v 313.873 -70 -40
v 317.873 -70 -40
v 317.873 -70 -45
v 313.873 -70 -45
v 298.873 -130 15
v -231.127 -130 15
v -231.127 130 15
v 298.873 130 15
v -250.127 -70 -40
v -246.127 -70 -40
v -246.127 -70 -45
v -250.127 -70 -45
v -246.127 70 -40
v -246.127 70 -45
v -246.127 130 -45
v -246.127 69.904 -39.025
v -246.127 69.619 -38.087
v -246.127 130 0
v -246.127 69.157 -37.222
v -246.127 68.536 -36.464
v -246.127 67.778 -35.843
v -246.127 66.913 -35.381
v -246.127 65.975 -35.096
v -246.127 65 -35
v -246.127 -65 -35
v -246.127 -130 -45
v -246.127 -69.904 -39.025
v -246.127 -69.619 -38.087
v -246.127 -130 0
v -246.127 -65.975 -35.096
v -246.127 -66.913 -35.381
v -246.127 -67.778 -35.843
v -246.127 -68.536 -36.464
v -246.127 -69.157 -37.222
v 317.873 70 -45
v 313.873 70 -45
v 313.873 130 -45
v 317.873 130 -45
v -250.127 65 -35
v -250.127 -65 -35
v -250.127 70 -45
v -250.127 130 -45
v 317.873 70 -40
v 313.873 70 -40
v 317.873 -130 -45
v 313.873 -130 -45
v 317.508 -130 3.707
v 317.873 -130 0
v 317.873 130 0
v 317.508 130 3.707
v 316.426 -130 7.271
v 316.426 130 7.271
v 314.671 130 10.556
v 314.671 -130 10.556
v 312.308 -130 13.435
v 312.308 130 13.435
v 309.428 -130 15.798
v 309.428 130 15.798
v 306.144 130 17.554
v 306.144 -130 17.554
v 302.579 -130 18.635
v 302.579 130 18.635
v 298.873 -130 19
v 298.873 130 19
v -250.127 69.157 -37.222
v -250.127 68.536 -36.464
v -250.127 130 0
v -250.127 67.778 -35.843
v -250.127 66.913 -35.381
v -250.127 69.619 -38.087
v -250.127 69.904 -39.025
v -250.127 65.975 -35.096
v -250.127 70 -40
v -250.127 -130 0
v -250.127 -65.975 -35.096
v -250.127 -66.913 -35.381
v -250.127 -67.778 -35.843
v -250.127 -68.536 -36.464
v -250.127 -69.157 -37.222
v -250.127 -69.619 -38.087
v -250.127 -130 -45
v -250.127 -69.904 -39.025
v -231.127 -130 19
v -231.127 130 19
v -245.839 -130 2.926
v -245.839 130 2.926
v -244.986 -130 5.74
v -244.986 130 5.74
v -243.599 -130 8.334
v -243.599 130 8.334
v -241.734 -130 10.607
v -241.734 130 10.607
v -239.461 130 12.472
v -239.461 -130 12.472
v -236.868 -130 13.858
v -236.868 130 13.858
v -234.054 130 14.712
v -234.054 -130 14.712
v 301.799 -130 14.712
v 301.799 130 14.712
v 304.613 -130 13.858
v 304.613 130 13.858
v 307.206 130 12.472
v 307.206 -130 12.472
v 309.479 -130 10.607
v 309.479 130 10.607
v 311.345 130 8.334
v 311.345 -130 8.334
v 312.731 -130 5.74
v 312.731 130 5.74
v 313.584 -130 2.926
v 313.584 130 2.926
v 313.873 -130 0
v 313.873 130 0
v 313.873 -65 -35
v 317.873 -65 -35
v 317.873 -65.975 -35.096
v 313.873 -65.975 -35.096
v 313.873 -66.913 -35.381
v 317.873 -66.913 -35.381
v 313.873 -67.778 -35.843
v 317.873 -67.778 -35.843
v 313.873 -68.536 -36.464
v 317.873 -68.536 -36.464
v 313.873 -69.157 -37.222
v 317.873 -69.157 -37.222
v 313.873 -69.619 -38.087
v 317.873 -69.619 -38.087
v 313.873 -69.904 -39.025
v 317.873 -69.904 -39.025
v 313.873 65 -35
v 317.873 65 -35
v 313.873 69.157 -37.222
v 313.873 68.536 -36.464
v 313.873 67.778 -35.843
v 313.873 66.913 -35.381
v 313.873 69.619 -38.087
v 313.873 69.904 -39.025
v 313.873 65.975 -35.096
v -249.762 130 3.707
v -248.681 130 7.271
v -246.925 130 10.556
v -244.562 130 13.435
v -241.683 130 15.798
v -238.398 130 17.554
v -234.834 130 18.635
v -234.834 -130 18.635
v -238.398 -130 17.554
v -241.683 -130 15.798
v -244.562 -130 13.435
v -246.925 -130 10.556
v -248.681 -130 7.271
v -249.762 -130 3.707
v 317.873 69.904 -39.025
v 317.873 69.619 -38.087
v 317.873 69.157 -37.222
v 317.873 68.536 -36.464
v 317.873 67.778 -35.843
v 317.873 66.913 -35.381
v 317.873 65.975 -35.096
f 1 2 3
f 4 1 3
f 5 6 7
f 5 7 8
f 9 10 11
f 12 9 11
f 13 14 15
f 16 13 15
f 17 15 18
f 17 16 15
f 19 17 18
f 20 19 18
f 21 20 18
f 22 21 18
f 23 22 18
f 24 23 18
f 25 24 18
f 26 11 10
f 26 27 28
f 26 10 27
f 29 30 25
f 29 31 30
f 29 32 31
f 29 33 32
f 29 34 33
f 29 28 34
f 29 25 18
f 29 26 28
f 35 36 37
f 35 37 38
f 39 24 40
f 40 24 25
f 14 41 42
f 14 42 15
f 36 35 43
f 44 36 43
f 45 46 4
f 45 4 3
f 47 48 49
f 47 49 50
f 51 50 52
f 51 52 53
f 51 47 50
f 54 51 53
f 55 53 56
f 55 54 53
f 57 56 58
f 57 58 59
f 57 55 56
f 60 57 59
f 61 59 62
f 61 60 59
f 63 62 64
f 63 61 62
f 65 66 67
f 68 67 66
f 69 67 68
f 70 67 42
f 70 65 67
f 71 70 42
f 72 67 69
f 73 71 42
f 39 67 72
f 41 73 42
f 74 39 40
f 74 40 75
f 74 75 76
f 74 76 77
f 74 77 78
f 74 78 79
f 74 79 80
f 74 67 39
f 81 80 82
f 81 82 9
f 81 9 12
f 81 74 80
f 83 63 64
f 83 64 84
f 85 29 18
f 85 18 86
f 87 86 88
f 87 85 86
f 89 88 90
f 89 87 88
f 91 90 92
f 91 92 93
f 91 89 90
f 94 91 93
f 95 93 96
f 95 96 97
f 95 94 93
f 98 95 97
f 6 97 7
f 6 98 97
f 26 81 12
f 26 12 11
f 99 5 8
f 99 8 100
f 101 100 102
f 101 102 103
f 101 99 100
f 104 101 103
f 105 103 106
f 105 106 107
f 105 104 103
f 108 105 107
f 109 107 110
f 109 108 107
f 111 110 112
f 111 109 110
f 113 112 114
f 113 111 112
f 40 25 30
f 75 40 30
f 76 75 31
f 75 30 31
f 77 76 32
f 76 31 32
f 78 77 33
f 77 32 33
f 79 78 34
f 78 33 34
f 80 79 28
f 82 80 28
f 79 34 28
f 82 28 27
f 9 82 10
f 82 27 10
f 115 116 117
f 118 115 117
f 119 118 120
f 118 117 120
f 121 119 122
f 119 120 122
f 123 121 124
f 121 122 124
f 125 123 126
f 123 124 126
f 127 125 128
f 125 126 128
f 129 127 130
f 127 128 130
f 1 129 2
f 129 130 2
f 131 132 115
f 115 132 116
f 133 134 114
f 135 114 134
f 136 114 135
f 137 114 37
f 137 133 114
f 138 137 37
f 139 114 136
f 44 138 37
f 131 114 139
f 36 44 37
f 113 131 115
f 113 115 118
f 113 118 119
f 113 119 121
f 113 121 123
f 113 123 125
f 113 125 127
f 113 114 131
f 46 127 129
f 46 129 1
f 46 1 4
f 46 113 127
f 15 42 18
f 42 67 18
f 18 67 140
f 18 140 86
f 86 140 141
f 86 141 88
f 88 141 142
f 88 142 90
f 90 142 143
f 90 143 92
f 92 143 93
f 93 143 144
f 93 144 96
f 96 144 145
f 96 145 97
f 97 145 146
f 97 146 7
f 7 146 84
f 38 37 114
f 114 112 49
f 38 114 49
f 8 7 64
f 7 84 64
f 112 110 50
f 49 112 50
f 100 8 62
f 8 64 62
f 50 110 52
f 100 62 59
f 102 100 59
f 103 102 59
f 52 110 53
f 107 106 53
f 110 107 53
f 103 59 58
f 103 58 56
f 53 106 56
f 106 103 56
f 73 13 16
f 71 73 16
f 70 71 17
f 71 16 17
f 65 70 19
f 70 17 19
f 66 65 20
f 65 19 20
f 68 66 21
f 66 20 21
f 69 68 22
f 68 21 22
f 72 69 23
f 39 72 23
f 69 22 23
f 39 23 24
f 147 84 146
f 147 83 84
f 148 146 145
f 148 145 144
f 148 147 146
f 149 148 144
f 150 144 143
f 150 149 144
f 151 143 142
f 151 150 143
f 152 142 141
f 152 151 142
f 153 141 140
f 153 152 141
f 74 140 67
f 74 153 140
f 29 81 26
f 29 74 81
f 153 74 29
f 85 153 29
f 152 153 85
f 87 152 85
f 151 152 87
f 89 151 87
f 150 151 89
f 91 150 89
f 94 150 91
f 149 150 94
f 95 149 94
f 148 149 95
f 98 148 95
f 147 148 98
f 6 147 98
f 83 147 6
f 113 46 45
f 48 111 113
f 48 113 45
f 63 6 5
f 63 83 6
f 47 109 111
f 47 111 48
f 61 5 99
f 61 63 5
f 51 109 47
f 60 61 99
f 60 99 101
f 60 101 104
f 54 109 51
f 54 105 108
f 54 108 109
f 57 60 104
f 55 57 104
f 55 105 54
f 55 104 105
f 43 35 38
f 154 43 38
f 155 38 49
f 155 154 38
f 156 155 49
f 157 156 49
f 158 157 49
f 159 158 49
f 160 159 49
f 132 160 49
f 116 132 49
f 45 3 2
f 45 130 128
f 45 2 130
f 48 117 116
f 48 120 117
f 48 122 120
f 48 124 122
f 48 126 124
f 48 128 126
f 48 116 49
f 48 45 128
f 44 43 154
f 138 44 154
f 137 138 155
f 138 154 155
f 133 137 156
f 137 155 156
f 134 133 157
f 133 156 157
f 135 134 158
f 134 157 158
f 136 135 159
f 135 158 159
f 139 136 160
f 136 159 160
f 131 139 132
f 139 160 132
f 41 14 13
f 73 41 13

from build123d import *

# Parameters (mm, degrees)
F1_DEPTH = 130
F3_DEPTH = 600


with BuildPart() as f1:
    # F0 (on Front) → F1 (new body, symmetric)
    with BuildSketch(Plane.XZ):
        with BuildLine():
            Line((-250.1273464697, -45), (-246.1273464697, -45))
            Line((-246.1273464697, -45), (-246.1273464697, 0))
            ThreePointArc((-246.1273464697, 0), (-241.7339481875, 10.6066017178), (-231.1273464697, 15))
            Line((-231.1273464697, 15), (298.8726535303, 15))
            ThreePointArc((298.8726535303, 15), (309.4792552481, 10.6066017178), (313.8726535303, 0))
            Line((313.8726535303, 0), (313.8726535303, -45))
            Line((313.8726535303, -45), (317.8726535303, -45))
            Line((317.8726535303, -45), (317.8726535303, 0))
            ThreePointArc((317.8726535303, 0), (312.3076823729, 13.4350288425), (298.8726535303, 19))
            Line((298.8726535303, 19), (-231.1273464697, 19))
            ThreePointArc((-231.1273464697, 19), (-244.5623753122, 13.4350288425), (-250.1273464697, 0))
            Line((-250.1273464697, 0), (-250.1273464697, -45))
        make_face()
    extrude(amount=F1_DEPTH, both=True)

    # F2 (on face) → F3 (cut)
    with BuildSketch(Plane.YZ.offset(317.8726535303)):
        with BuildLine():
            Line((-70, -45), (70, -45))
            Line((70, -45), (70, -40))
            ThreePointArc((70, -40), (68.5355339059, -36.4644660941), (65, -35))
            Line((65, -35), (-65, -35))
            ThreePointArc((-65, -35), (-68.5355339059, -36.4644660941), (-70, -40))
            Line((-70, -40), (-70, -45))
        make_face()
    extrude(amount=-F3_DEPTH, mode=Mode.SUBTRACT)


solid = f1.part
